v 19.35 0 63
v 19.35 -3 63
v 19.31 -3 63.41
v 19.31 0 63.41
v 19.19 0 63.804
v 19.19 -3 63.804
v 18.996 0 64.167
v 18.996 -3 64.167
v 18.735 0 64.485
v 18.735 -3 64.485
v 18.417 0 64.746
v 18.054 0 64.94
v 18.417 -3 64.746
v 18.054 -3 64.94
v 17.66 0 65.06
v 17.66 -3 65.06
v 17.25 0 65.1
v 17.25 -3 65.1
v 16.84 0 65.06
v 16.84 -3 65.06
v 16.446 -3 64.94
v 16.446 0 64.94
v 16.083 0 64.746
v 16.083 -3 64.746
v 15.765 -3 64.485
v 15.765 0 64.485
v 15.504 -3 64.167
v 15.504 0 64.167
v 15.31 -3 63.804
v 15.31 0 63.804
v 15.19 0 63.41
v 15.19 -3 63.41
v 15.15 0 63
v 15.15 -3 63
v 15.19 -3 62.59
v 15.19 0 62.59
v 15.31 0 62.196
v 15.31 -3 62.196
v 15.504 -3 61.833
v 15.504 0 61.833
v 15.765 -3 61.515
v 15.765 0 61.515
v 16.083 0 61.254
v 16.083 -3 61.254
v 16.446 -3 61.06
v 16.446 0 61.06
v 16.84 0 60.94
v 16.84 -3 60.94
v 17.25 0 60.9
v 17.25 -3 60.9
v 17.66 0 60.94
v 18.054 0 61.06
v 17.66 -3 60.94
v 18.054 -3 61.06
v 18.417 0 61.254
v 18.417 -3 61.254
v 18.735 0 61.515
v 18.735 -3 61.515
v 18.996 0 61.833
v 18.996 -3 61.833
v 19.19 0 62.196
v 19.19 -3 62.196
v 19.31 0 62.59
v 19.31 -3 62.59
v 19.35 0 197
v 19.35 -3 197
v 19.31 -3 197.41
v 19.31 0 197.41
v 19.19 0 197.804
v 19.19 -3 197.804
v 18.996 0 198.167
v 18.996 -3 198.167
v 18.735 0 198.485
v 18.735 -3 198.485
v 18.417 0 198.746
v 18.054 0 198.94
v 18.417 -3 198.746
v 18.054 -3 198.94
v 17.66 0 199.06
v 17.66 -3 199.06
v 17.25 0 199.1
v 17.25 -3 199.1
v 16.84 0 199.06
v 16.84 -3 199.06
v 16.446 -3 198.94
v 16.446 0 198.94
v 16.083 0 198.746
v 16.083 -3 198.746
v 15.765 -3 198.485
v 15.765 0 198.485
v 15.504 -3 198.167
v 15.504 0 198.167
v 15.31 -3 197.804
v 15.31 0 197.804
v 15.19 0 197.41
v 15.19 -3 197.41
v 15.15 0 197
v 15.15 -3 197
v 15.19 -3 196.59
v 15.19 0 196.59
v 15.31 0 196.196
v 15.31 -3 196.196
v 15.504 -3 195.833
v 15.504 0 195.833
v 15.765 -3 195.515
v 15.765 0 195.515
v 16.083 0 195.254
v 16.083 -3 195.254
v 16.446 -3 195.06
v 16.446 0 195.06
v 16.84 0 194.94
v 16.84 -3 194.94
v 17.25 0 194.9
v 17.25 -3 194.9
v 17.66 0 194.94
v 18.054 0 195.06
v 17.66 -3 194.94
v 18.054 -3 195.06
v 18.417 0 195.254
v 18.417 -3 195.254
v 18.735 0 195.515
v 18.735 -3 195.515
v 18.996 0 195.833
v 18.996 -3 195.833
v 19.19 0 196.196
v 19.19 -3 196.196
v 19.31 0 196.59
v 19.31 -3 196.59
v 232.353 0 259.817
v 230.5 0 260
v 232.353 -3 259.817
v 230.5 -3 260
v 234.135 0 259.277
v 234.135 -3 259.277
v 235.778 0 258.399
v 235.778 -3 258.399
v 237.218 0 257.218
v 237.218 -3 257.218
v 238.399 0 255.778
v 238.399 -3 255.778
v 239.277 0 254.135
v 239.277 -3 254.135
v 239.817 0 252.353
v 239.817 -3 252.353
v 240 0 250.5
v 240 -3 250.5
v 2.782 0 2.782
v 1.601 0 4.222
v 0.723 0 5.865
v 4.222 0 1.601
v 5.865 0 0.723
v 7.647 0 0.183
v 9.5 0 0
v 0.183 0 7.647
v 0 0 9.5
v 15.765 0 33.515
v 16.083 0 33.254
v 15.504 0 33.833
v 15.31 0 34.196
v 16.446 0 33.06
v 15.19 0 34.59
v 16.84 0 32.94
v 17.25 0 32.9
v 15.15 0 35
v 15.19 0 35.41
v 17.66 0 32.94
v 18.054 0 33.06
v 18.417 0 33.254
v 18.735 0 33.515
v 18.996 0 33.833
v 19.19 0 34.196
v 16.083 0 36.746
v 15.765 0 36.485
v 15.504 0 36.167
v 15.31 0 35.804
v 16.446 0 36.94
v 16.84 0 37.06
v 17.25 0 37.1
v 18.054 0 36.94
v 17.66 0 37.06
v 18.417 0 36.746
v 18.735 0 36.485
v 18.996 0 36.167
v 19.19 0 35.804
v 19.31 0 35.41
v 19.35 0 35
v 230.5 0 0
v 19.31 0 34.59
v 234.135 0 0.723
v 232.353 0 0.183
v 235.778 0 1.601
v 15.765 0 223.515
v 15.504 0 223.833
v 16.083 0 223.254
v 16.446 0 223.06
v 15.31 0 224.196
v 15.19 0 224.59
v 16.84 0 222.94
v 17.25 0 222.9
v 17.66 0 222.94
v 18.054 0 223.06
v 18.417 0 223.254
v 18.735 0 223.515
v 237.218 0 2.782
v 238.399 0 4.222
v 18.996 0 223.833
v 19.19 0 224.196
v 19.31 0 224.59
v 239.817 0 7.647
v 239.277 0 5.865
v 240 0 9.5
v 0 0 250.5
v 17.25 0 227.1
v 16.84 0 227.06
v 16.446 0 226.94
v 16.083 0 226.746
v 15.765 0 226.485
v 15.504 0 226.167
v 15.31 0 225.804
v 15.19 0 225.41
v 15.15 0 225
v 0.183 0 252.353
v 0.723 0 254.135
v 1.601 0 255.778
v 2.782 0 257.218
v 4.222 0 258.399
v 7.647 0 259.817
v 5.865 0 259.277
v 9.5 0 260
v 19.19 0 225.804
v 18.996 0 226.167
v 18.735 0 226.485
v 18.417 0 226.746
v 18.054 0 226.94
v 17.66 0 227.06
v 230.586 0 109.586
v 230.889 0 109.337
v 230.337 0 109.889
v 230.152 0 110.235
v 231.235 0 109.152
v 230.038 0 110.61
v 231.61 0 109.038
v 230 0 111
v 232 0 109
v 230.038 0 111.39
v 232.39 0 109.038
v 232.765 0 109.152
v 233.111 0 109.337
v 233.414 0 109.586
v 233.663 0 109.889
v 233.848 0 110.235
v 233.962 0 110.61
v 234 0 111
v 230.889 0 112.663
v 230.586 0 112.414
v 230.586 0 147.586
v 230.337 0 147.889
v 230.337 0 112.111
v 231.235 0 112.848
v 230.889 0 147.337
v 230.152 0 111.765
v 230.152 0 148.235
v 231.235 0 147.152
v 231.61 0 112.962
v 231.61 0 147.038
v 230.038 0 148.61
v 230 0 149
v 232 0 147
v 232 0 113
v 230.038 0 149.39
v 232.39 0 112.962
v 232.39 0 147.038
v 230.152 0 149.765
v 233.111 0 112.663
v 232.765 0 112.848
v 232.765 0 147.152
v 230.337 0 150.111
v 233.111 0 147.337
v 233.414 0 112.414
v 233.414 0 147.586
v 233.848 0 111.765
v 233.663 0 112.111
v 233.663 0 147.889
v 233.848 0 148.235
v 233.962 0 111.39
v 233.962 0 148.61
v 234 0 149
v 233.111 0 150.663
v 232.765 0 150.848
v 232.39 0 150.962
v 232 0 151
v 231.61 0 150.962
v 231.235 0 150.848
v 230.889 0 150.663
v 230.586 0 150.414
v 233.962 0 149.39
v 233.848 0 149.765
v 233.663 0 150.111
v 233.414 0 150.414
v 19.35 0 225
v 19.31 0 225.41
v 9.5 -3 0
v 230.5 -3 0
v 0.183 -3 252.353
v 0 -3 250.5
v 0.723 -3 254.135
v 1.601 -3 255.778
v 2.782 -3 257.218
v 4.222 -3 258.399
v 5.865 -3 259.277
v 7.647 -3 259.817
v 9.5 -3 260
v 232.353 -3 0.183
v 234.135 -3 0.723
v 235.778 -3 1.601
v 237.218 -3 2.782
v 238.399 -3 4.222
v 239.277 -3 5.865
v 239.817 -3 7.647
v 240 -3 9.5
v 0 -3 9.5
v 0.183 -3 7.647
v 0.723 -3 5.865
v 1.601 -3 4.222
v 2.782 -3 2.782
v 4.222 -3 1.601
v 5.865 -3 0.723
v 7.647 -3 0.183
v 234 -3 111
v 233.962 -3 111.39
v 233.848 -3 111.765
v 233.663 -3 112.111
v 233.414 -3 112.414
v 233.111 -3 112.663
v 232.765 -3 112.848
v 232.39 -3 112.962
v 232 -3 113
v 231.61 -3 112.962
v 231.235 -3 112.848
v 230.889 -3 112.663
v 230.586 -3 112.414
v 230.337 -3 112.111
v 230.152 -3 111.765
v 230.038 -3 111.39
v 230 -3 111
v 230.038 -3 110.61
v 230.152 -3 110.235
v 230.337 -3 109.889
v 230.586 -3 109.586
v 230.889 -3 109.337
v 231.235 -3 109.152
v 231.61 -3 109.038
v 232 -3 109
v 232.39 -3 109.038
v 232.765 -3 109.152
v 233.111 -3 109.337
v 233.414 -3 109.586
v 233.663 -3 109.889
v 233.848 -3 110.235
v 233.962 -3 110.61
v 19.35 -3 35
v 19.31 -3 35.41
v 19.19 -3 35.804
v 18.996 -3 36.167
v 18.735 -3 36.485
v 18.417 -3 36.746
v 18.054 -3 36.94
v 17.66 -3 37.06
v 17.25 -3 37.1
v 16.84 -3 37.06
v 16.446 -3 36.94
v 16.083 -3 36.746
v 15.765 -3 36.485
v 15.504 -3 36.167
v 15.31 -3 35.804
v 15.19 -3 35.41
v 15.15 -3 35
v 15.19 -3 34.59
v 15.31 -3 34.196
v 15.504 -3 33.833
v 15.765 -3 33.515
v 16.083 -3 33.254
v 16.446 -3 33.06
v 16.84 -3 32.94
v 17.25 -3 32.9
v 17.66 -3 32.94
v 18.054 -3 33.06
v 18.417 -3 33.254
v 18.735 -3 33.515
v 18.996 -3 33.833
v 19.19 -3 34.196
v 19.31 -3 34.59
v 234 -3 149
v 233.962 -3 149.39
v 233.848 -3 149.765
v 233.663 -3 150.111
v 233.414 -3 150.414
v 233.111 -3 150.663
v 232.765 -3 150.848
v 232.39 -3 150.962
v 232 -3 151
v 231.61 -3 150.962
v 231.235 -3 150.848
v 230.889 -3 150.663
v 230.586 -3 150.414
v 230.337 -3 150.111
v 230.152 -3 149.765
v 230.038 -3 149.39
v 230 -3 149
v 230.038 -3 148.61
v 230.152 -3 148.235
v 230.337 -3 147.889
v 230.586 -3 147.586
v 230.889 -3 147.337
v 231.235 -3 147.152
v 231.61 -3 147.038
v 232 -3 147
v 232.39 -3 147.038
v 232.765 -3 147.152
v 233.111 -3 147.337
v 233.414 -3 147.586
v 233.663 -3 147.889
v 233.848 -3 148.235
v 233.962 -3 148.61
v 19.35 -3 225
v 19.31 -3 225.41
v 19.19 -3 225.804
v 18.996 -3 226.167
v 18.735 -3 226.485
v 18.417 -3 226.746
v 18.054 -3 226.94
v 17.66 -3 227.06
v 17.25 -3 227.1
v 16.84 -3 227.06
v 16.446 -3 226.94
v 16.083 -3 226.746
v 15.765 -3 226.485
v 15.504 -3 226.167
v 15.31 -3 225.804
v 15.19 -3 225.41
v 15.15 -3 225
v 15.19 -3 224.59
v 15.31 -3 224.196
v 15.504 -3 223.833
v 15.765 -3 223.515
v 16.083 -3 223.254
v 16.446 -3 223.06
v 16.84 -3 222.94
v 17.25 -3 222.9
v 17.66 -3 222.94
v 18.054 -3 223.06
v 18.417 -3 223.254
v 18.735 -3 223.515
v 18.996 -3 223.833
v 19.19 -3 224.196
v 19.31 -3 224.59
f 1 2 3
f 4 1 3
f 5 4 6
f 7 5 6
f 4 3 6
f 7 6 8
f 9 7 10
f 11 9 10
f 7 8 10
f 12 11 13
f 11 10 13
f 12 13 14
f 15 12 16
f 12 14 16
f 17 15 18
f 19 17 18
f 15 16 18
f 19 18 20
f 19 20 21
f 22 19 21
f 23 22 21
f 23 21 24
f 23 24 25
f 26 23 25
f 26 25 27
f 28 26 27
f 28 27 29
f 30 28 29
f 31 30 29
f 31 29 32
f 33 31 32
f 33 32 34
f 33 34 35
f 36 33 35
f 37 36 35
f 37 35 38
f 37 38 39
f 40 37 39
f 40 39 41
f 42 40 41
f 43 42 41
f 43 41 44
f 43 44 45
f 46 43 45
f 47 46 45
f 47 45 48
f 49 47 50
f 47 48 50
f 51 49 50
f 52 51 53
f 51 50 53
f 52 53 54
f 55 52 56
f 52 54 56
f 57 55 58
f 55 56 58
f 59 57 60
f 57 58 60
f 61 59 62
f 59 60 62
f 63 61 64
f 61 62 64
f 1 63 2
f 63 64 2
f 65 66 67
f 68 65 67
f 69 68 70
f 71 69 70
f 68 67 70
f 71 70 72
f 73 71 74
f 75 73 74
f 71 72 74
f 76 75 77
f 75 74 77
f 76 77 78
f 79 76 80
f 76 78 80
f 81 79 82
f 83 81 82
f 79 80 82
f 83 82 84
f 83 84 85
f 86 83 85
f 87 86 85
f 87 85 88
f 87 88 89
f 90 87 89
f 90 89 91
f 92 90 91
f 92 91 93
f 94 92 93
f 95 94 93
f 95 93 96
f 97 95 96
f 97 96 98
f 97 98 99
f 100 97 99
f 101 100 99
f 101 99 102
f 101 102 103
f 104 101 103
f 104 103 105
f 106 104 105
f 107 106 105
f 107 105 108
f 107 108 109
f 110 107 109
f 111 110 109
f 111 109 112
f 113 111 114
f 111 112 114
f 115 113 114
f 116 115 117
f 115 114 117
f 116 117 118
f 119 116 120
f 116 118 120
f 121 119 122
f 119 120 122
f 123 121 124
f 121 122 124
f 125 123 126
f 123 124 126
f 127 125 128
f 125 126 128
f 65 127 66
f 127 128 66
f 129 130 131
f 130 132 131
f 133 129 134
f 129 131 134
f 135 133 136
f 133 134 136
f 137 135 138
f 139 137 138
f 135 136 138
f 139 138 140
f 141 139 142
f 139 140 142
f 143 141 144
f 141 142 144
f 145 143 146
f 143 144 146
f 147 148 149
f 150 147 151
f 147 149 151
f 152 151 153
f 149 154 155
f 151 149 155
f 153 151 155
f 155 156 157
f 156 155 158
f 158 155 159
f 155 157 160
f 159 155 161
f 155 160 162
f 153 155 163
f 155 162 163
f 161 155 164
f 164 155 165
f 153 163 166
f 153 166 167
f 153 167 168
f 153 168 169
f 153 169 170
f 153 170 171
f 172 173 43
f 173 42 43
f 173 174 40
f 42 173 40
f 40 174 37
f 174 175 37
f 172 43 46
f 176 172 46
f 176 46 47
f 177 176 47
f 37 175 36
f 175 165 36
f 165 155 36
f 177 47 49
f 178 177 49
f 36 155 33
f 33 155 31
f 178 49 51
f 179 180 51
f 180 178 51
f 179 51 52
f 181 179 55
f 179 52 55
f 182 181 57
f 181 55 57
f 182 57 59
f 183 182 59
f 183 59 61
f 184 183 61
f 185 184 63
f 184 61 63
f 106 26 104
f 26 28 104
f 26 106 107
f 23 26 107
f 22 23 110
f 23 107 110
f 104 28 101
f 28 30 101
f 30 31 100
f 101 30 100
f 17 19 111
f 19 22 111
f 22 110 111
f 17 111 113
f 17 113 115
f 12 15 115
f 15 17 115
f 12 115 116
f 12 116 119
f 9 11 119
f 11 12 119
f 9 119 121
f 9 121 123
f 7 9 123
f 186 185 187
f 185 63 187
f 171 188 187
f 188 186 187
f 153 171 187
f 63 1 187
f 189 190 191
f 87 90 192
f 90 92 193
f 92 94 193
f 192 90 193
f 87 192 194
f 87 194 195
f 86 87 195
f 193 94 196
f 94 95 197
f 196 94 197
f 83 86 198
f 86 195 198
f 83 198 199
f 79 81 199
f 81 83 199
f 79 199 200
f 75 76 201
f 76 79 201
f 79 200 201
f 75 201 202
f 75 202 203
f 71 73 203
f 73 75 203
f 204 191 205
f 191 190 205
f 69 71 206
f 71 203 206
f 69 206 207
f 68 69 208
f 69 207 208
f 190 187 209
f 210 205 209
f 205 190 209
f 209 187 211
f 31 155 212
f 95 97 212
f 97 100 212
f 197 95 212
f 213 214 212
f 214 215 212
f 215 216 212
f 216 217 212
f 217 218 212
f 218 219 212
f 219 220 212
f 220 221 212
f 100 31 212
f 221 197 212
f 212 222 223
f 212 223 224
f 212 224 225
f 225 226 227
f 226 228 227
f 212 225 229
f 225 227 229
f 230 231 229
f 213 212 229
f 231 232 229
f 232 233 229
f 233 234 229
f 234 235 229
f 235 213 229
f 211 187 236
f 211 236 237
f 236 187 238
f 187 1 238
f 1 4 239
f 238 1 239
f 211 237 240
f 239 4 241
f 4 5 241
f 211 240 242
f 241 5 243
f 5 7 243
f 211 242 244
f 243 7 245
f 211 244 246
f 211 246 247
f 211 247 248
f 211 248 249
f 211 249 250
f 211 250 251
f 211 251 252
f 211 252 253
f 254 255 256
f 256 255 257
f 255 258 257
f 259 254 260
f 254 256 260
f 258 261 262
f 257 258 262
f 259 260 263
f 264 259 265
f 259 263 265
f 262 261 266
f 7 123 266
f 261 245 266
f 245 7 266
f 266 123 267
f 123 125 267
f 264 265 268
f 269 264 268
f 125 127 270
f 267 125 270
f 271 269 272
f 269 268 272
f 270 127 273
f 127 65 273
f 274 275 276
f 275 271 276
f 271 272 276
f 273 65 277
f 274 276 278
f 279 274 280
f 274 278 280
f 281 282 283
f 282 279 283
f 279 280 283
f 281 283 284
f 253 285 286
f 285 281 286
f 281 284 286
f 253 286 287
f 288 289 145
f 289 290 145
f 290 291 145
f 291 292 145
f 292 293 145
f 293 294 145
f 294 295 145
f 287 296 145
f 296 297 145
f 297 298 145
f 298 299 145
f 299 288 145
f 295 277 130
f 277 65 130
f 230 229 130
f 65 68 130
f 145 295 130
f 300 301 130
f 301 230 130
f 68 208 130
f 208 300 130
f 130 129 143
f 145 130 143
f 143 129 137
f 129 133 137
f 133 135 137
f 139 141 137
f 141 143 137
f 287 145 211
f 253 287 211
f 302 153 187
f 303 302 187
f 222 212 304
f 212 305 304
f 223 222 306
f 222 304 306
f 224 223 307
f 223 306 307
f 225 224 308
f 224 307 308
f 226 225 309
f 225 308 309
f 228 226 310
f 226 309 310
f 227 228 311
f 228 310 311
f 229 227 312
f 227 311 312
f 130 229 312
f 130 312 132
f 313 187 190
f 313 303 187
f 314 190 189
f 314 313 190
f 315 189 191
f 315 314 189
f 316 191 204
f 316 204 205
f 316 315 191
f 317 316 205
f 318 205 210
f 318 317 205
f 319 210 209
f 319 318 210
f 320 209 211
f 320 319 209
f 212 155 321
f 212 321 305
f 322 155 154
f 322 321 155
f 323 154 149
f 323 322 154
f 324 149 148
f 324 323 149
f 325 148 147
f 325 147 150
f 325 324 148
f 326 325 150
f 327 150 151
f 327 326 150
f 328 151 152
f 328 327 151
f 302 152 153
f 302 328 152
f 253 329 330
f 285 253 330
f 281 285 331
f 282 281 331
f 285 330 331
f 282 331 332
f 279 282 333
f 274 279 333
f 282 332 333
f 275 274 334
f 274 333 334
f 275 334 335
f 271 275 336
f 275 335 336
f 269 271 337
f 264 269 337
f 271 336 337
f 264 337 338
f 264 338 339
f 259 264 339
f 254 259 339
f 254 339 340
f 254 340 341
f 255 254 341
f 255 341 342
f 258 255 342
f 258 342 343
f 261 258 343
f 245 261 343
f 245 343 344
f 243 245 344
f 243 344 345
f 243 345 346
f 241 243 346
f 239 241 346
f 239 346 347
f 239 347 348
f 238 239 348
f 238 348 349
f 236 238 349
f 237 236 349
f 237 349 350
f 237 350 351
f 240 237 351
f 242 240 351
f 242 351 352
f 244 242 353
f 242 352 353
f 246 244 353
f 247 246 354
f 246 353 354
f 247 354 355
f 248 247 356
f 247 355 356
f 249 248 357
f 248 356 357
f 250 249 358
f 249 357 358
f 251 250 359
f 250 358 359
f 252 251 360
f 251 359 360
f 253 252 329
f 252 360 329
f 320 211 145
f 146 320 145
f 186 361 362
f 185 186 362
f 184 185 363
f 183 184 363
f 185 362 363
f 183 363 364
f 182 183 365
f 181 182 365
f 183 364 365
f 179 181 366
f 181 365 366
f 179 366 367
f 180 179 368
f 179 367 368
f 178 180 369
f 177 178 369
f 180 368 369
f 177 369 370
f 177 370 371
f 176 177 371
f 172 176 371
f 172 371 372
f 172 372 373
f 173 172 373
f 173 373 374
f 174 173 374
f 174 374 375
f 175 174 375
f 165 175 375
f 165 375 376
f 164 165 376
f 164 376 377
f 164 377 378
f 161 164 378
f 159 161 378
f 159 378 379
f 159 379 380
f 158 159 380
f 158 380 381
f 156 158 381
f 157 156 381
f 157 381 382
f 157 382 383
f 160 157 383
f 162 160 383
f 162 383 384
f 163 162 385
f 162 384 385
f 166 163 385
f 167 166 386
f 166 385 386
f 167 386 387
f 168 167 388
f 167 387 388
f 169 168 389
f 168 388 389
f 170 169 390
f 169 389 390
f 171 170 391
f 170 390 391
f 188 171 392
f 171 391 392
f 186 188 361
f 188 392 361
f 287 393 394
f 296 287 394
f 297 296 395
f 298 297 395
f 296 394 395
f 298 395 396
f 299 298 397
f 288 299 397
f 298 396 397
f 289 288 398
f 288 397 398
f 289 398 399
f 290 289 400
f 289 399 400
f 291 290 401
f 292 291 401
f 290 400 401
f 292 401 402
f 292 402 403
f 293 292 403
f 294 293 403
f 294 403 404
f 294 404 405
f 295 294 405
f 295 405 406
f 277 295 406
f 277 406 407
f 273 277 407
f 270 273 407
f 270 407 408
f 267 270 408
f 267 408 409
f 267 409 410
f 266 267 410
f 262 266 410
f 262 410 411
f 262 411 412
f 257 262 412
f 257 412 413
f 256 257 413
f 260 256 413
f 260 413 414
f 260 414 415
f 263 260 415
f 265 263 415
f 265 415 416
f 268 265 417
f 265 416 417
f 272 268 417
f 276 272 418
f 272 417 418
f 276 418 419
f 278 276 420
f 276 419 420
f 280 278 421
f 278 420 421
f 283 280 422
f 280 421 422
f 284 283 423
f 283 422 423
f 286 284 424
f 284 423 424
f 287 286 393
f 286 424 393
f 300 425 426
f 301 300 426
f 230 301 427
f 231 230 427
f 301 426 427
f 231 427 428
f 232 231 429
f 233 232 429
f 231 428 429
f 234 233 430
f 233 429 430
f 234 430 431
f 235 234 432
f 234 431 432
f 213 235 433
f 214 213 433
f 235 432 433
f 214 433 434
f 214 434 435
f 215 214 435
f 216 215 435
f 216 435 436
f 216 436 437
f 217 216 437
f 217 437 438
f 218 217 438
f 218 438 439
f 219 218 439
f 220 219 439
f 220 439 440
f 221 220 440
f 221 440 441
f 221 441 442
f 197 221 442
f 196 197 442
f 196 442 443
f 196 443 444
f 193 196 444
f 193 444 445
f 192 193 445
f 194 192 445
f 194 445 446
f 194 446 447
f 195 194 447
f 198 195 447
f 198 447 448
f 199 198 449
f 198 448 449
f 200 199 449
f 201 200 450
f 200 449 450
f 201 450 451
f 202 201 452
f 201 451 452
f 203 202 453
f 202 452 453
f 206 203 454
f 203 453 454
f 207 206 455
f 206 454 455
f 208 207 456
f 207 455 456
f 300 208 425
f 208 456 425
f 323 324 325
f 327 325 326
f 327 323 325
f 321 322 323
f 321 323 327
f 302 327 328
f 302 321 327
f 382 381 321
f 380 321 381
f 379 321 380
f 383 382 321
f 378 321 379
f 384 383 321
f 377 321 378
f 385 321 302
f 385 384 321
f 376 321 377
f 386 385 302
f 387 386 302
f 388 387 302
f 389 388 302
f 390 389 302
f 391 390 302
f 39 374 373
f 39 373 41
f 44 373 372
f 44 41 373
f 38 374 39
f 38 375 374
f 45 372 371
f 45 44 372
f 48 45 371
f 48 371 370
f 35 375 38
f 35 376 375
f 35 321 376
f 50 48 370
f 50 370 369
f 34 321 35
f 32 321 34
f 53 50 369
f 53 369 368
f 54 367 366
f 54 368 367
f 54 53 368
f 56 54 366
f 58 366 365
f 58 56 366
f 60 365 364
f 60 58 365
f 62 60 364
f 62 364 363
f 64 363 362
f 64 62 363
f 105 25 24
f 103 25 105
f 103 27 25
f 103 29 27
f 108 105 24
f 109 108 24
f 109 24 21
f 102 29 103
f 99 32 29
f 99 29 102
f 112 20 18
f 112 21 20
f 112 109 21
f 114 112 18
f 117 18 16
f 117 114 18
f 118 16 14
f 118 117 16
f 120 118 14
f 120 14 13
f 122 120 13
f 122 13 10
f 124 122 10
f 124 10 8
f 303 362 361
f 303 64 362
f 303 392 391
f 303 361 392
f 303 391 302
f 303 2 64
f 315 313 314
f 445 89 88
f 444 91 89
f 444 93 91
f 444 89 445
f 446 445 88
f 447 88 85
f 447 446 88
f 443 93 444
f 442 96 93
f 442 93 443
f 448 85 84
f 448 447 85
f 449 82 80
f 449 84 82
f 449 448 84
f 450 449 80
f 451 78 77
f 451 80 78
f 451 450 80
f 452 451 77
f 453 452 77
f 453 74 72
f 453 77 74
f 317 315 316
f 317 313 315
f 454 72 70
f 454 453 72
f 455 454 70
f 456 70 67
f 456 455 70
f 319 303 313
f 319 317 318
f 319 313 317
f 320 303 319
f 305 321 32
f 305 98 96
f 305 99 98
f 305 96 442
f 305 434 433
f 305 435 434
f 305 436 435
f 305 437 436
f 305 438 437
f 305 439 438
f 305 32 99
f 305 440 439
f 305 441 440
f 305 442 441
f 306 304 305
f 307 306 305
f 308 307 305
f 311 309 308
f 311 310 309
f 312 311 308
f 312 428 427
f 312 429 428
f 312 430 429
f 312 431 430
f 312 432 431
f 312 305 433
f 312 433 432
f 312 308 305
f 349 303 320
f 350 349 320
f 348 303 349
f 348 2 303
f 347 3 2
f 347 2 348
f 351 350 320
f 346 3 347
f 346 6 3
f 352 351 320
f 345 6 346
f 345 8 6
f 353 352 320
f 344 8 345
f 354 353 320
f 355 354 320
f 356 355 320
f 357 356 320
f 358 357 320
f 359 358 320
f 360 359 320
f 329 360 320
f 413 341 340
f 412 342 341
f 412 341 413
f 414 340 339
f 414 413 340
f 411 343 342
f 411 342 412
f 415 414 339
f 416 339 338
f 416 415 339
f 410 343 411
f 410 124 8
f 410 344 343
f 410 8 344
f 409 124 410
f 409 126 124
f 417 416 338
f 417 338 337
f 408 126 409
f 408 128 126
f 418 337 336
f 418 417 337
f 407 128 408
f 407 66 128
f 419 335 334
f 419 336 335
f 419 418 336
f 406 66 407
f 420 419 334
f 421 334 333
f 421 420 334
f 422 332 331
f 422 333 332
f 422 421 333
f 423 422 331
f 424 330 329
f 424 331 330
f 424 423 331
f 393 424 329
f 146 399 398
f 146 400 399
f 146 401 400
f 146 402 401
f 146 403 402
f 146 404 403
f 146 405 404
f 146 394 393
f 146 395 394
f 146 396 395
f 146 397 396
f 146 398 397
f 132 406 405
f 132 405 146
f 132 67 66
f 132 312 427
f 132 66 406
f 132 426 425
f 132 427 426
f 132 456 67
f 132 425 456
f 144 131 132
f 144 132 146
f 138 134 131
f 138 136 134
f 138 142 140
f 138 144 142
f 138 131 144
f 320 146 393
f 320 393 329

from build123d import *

# Parameters (mm, degrees)
SKETCH_W        = 240
SKETCH_H        = 260
PAD_DEPTH       = 3
SKETCH001_R     = 2.1
POCKET_DEPTH    = 5
FILLET_R        = 9.5
SKETCH002_R     = 2
POCKET001_DEPTH = 3.001


with BuildPart() as part:
    # Sketch → Pad (new body)
    with BuildSketch(Plane.XZ):
        with Locations((120, 130)):
            Rectangle(SKETCH_W, SKETCH_H)
    extrude(amount=PAD_DEPTH)

    # Sketch001 (on Face6 of Pad) → Pocket (cut)
    with BuildSketch(Plane.XZ.offset(3)):
        with Locations((17.25, 225)):
            Circle(SKETCH001_R)
        with Locations((17.25, 197)):
            Circle(SKETCH001_R)
        with Locations((17.25, 63)):
            Circle(SKETCH001_R)
        with Locations((17.25, 35)):
            Circle(SKETCH001_R)
    extrude(amount=-POCKET_DEPTH, mode=Mode.SUBTRACT)

    # Fillet
    fillet_edges = [part.edges().sort_by_distance(p)[0] for p in [
        (0, -1.5, 260),
        (240, -1.5, 260),
        (240, -1.5, 0),
        (0, -1.5, 0),
    ]]
    fillet(fillet_edges, radius=FILLET_R)

    # Sketch002 (on Face5 of Fillet) → Pocket001 (cut, through all)
    with BuildSketch(Plane.XZ.offset(3)):
        with Locations((232, 149)):
            Circle(SKETCH002_R)
        with Locations((232, 111)):
            Circle(SKETCH002_R)
    extrude(amount=-POCKET001_DEPTH, mode=Mode.SUBTRACT)


solid = part.part
